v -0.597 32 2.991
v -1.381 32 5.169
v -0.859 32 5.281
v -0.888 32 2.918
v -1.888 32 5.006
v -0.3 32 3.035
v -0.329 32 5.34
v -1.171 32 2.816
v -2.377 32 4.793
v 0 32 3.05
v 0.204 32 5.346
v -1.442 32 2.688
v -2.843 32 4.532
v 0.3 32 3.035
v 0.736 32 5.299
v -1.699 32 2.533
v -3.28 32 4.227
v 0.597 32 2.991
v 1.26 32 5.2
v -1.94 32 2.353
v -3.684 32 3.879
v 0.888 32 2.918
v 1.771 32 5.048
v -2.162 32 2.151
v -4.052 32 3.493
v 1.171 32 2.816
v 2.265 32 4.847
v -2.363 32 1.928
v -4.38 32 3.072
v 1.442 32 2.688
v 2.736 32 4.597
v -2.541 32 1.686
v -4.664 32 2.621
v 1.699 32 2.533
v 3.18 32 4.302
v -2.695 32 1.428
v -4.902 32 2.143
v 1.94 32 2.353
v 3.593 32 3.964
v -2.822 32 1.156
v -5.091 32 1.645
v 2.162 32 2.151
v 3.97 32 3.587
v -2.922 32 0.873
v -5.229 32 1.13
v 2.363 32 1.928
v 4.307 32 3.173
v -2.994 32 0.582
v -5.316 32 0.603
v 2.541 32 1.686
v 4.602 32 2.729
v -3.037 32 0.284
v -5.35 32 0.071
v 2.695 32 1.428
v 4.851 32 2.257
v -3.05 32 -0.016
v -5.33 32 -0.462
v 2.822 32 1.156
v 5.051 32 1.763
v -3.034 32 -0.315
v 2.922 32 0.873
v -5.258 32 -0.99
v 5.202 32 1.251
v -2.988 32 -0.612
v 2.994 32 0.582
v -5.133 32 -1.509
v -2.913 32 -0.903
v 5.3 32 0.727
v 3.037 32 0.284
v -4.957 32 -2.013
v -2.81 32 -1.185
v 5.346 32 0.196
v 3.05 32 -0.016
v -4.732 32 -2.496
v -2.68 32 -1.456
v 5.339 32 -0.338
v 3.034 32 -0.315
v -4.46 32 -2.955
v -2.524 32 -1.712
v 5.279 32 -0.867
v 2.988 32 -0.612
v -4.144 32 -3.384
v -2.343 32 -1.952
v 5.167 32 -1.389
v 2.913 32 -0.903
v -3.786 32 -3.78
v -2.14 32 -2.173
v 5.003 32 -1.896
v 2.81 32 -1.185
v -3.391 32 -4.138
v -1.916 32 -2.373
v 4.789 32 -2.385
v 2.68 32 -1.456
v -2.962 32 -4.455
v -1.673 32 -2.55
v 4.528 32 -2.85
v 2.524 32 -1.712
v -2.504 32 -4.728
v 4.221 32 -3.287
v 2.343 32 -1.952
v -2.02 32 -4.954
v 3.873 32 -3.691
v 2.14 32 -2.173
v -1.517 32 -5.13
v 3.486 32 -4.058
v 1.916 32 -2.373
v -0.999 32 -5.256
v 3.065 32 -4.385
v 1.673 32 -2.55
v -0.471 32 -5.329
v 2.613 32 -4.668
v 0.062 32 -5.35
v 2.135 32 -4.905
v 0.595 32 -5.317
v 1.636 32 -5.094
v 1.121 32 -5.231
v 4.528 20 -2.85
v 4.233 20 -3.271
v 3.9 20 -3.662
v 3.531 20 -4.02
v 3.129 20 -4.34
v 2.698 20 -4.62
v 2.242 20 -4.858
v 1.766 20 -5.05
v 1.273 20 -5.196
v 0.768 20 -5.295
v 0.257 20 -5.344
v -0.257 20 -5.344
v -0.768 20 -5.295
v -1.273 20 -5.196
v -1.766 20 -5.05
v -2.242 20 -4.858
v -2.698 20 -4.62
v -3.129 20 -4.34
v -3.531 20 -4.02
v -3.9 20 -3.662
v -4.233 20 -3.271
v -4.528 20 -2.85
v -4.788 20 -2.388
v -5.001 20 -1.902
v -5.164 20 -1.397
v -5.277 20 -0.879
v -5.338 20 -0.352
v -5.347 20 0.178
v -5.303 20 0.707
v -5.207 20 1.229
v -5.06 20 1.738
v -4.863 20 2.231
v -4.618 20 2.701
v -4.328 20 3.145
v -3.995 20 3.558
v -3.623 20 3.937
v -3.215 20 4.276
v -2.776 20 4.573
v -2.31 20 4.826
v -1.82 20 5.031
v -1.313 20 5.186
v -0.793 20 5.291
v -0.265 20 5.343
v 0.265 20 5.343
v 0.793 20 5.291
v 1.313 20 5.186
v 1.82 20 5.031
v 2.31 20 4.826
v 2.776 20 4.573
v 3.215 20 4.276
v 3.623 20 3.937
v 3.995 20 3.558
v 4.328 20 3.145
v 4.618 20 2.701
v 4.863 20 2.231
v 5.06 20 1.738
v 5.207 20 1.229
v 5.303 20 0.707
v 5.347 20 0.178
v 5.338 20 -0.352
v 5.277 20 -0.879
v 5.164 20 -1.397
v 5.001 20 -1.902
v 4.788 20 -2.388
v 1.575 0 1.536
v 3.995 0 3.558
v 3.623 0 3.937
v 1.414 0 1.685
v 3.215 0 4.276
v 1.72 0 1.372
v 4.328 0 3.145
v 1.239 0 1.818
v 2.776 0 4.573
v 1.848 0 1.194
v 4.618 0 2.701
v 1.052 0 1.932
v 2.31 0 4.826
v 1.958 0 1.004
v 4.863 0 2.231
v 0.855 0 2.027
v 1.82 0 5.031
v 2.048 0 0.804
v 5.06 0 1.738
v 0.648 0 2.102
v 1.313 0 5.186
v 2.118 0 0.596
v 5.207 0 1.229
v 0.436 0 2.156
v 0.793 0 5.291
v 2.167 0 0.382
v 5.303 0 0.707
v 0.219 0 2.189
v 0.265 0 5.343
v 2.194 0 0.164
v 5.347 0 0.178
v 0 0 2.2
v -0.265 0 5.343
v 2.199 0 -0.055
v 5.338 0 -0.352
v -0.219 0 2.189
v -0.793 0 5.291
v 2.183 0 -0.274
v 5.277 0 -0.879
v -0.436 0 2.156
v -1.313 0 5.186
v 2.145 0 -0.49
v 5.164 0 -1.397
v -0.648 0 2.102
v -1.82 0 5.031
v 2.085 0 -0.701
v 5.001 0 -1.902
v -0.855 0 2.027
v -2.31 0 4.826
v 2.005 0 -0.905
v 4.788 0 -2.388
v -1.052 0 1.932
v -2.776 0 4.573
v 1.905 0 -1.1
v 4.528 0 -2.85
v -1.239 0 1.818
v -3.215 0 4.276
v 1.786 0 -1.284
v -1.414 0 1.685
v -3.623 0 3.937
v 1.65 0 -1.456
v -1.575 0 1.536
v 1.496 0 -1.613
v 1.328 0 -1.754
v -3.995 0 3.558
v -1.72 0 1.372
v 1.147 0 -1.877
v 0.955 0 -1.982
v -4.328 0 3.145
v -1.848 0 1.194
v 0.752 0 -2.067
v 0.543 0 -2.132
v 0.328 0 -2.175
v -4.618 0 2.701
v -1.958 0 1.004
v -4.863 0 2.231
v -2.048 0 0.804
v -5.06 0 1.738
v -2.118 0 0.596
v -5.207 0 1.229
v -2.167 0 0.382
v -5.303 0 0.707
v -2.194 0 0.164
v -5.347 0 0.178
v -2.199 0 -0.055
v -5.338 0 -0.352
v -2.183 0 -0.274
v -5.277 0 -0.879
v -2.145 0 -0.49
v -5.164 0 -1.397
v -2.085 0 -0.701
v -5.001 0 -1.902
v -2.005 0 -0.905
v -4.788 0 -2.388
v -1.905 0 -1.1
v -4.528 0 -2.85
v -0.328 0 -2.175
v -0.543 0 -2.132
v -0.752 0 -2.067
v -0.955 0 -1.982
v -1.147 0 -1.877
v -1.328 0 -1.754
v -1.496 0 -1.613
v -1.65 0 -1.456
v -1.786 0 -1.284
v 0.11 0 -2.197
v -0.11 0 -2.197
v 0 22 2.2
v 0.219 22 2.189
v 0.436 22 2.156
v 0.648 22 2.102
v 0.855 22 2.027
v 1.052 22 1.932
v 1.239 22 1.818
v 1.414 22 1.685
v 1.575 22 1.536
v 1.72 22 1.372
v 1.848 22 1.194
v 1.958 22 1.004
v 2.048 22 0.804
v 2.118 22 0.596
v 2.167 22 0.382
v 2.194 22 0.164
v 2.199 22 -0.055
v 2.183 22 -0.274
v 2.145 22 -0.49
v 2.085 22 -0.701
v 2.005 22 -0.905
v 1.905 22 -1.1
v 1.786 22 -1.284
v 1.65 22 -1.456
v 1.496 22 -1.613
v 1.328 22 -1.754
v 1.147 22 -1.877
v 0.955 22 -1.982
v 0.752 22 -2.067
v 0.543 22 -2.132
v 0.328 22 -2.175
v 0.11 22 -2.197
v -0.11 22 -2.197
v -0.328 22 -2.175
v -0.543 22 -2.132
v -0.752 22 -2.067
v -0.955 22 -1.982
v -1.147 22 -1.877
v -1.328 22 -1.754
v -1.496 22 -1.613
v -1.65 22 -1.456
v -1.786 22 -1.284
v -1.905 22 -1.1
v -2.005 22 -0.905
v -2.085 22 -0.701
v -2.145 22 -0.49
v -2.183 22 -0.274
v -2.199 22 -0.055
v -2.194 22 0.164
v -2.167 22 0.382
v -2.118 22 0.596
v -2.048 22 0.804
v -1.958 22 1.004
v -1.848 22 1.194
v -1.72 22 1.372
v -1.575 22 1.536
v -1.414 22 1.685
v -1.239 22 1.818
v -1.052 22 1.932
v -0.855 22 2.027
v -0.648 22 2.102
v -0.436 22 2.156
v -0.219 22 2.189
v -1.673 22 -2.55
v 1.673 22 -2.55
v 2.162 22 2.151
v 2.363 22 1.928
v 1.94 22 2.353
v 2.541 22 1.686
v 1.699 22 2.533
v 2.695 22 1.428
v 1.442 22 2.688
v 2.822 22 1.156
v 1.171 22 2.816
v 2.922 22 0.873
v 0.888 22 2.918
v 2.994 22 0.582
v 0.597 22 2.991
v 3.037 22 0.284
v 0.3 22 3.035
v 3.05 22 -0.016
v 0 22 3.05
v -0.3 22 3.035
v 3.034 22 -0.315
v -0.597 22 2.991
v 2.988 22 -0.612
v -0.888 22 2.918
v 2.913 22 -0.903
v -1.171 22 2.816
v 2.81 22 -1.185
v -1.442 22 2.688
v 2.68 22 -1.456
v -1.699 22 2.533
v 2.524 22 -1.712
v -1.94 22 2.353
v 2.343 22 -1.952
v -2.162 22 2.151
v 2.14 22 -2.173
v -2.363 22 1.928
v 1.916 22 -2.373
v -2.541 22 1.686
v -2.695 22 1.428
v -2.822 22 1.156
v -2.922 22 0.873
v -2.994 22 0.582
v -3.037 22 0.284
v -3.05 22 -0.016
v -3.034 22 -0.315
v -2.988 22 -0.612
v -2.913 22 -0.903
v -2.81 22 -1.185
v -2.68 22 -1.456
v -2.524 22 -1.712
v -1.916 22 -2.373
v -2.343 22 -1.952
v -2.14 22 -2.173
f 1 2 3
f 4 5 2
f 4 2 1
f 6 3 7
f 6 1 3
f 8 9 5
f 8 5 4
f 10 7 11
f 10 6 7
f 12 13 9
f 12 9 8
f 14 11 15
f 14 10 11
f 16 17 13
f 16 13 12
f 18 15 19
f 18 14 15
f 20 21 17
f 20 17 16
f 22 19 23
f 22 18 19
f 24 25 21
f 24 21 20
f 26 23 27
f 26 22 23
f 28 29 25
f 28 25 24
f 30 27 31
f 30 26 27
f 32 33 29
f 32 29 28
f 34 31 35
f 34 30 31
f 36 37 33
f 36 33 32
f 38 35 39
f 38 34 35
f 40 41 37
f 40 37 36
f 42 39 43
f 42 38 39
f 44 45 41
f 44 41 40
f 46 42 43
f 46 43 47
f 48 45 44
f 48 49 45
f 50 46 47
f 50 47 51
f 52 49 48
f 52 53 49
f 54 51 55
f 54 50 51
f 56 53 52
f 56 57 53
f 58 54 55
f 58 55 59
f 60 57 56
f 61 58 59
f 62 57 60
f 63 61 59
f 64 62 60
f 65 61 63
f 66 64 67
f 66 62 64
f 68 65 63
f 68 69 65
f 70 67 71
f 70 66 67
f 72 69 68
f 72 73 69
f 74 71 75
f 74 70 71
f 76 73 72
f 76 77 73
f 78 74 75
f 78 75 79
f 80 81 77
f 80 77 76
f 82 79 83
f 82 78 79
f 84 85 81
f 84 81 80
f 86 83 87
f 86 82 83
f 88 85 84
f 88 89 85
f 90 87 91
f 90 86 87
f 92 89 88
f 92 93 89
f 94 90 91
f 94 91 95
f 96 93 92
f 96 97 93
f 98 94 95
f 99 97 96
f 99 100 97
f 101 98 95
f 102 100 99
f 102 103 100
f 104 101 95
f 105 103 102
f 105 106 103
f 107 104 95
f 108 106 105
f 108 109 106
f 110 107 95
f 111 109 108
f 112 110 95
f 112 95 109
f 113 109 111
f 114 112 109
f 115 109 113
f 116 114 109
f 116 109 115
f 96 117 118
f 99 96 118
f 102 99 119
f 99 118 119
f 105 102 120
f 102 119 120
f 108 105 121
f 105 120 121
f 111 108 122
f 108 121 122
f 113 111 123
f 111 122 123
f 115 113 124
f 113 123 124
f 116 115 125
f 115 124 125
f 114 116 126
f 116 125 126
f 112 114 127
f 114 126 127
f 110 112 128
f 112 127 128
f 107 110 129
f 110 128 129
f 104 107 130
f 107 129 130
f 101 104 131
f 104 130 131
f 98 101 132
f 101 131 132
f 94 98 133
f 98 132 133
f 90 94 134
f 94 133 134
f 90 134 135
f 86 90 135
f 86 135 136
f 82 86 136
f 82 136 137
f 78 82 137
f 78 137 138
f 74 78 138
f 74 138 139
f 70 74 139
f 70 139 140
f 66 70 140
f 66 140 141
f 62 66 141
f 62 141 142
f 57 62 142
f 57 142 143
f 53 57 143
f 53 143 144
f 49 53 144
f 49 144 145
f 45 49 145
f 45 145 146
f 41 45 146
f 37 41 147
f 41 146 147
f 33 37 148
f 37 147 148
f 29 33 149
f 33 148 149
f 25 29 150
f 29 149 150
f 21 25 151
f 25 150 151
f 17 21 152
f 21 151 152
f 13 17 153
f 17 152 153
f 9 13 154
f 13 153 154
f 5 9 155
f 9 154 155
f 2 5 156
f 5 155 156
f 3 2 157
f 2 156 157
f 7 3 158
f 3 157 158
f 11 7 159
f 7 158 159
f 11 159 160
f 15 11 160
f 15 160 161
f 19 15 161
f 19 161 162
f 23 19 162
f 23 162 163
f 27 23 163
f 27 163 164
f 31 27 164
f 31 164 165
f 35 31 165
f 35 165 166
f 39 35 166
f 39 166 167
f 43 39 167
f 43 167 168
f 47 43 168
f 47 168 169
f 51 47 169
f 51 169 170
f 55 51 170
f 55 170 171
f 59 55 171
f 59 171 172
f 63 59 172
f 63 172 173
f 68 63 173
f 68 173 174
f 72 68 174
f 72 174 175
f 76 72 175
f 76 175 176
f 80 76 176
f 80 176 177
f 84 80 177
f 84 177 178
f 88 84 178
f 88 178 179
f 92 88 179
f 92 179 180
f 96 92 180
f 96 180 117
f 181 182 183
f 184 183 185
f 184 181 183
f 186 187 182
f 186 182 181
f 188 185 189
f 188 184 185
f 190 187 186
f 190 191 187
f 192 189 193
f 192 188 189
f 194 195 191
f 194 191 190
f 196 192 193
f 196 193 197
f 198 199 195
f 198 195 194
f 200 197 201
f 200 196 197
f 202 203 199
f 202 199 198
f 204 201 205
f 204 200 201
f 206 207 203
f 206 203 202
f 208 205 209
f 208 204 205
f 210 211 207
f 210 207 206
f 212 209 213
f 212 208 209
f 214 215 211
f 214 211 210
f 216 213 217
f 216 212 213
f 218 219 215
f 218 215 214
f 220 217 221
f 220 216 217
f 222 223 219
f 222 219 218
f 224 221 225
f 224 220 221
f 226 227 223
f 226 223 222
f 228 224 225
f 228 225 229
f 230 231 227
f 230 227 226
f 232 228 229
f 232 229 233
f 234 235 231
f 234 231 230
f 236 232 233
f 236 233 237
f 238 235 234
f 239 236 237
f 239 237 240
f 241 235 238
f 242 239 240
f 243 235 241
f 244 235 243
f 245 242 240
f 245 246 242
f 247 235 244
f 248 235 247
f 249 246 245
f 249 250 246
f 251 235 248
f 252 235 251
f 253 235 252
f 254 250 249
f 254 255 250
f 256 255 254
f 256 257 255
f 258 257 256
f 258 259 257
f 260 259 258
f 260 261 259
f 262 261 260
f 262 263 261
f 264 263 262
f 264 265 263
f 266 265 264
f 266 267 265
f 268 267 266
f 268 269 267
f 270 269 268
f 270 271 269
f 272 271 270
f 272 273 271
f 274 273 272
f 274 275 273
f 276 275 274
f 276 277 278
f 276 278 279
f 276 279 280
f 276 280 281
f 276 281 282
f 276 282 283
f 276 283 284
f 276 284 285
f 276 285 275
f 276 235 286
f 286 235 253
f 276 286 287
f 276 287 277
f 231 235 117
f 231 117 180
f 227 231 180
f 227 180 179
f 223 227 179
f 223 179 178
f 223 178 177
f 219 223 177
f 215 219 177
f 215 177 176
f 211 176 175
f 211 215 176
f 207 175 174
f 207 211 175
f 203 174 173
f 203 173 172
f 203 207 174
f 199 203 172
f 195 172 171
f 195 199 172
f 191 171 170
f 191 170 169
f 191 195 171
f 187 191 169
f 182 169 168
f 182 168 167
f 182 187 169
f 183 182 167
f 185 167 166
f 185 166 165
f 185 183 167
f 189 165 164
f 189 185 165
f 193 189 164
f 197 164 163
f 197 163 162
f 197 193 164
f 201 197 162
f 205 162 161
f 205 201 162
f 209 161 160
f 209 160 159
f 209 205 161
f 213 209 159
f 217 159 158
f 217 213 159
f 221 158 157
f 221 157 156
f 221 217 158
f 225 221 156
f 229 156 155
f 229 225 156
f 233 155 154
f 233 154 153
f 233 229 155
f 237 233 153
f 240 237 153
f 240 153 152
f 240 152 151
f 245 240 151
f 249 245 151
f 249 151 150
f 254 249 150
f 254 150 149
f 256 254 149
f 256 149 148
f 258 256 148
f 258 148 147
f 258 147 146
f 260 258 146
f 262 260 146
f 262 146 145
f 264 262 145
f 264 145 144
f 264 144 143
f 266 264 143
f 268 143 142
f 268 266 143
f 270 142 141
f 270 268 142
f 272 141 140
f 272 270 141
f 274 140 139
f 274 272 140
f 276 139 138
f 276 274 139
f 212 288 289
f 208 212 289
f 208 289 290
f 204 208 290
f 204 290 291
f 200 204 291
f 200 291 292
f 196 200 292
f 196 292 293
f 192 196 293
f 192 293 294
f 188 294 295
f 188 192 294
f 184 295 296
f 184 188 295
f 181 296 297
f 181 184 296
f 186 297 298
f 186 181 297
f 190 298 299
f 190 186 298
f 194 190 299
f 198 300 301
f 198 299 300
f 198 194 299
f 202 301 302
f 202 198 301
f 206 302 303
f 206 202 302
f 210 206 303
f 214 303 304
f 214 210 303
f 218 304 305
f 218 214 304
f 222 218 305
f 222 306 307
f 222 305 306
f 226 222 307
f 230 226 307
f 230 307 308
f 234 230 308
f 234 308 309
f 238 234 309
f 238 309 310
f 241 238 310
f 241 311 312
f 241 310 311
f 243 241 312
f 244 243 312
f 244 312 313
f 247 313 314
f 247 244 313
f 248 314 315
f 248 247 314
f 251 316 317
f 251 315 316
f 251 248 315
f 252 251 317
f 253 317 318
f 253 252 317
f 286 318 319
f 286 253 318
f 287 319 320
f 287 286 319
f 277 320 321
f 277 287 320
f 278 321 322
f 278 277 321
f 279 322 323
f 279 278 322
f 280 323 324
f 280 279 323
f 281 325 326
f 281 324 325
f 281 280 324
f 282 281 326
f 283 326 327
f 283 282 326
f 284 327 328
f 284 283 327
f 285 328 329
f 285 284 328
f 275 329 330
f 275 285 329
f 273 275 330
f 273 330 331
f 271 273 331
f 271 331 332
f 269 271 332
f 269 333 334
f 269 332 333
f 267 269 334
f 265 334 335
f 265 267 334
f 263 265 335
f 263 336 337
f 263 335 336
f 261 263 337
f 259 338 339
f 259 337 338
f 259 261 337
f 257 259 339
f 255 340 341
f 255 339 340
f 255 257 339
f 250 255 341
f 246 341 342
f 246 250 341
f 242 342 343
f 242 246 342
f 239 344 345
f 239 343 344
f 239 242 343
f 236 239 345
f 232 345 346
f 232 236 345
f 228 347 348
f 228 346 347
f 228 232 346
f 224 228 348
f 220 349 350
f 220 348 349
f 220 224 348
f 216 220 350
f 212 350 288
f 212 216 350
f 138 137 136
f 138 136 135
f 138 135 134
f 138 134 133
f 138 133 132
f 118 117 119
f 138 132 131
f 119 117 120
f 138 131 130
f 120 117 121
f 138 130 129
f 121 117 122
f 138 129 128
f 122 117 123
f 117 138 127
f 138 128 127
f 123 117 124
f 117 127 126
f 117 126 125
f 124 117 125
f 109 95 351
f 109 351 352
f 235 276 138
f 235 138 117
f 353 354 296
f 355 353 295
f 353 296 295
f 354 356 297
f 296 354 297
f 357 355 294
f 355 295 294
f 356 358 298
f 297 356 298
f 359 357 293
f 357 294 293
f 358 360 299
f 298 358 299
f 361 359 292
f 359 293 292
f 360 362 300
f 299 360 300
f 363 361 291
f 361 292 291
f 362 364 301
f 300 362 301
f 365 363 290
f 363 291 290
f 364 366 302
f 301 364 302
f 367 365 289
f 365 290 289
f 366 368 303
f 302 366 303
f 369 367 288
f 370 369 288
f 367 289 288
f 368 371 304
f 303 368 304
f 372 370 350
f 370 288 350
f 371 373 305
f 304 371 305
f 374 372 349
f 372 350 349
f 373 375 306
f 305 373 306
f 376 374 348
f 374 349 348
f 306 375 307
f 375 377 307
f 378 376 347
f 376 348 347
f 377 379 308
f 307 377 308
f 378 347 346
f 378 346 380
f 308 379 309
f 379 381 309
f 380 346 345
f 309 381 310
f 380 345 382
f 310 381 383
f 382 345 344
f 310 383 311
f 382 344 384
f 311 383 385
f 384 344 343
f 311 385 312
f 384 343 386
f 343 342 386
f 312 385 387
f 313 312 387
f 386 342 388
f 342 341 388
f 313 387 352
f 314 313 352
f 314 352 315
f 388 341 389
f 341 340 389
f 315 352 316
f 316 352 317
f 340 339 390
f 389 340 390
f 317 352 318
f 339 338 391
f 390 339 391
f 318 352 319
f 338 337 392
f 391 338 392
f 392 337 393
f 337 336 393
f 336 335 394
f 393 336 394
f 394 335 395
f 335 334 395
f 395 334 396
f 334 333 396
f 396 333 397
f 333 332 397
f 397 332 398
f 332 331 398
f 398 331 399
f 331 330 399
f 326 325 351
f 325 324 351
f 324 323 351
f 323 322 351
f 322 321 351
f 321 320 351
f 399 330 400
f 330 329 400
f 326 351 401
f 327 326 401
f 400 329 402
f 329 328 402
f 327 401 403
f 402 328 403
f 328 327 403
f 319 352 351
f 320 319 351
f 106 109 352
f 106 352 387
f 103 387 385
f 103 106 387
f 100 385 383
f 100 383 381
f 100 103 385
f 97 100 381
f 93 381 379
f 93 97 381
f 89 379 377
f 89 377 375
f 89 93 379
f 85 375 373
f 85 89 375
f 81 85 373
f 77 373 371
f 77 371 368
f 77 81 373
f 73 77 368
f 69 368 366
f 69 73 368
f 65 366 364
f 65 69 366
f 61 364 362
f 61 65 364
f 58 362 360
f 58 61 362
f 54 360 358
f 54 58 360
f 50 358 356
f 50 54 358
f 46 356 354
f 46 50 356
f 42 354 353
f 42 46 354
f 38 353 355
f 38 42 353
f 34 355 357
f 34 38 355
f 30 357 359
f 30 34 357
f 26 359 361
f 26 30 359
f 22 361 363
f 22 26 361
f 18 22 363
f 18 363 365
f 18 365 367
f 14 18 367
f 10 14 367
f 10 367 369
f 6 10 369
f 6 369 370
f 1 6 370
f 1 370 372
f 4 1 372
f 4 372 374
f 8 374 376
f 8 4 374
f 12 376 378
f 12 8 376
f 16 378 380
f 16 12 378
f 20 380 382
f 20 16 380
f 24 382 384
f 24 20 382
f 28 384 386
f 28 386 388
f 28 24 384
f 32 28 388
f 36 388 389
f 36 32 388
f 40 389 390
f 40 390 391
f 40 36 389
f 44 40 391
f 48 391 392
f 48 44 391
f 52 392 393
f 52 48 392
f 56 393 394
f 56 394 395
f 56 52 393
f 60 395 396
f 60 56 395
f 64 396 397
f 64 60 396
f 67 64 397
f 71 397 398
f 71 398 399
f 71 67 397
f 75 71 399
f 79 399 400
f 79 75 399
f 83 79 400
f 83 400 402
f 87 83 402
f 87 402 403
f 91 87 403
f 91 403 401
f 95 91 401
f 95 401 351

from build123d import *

# Parameters (mm, degrees)
IZIM1_R                     = 2.2
Y_KSEKLIK_EKSTR_ZYON1_DEPTH = 20
IZIM2_R                     = 5.35
IZIM2_R_2                   = 2.2
Y_KSEKLIK_EKSTR_ZYON2_DEPTH = 12
KES_EKSTR_ZYON1_DEPTH       = 10


with BuildPart() as part:
    # Çizim1 → Yükseklik-Ekstrüzyon1 (new body)
    with BuildSketch(Plane(origin=(0, 0, 0), x_dir=(1, 0, 0), z_dir=(0, 1, 0))):
        with BuildLine():
            Line((-4.527692569, 2.85), (4.527692569, 2.85))
            ThreePointArc((4.527692569, 2.85), (0, -5.35), (-4.527692569, 2.85))
        make_face()
        with Locations(Location((0, 0, 0), (0, 0, 270))):
            Circle(IZIM1_R, mode=Mode.SUBTRACT)
    extrude(amount=Y_KSEKLIK_EKSTR_ZYON1_DEPTH)

    # Çizim2 → Yükseklik-Ekstrüzyon2 (add)
    with BuildSketch(Plane(origin=(0, 20, 0), x_dir=(1, 0, 0), z_dir=(0, 1, 0))):
        with Locations(Location((0, 0, 0), (0, 0, 32.188761118))):
            Circle(IZIM2_R)
        with Locations(Location((0, 0, 0), (0, 0, 270))):
            Circle(IZIM2_R_2, mode=Mode.SUBTRACT)
    extrude(amount=Y_KSEKLIK_EKSTR_ZYON2_DEPTH)

    # Çizim3 → Kes-Ekstrüzyon1 (cut)
    with BuildSketch(Plane(origin=(0, 32, 0), x_dir=(1, 0, 0), z_dir=(0, 1, 0))):
        with BuildLine():
            Line((-1.673320053, 2.55), (1.673320053, 2.55))
            ThreePointArc((1.673320053, 2.55), (0, -3.05), (-1.673320053, 2.55))
        make_face()
    extrude(amount=-KES_EKSTR_ZYON1_DEPTH, mode=Mode.SUBTRACT)


solid = part.part
